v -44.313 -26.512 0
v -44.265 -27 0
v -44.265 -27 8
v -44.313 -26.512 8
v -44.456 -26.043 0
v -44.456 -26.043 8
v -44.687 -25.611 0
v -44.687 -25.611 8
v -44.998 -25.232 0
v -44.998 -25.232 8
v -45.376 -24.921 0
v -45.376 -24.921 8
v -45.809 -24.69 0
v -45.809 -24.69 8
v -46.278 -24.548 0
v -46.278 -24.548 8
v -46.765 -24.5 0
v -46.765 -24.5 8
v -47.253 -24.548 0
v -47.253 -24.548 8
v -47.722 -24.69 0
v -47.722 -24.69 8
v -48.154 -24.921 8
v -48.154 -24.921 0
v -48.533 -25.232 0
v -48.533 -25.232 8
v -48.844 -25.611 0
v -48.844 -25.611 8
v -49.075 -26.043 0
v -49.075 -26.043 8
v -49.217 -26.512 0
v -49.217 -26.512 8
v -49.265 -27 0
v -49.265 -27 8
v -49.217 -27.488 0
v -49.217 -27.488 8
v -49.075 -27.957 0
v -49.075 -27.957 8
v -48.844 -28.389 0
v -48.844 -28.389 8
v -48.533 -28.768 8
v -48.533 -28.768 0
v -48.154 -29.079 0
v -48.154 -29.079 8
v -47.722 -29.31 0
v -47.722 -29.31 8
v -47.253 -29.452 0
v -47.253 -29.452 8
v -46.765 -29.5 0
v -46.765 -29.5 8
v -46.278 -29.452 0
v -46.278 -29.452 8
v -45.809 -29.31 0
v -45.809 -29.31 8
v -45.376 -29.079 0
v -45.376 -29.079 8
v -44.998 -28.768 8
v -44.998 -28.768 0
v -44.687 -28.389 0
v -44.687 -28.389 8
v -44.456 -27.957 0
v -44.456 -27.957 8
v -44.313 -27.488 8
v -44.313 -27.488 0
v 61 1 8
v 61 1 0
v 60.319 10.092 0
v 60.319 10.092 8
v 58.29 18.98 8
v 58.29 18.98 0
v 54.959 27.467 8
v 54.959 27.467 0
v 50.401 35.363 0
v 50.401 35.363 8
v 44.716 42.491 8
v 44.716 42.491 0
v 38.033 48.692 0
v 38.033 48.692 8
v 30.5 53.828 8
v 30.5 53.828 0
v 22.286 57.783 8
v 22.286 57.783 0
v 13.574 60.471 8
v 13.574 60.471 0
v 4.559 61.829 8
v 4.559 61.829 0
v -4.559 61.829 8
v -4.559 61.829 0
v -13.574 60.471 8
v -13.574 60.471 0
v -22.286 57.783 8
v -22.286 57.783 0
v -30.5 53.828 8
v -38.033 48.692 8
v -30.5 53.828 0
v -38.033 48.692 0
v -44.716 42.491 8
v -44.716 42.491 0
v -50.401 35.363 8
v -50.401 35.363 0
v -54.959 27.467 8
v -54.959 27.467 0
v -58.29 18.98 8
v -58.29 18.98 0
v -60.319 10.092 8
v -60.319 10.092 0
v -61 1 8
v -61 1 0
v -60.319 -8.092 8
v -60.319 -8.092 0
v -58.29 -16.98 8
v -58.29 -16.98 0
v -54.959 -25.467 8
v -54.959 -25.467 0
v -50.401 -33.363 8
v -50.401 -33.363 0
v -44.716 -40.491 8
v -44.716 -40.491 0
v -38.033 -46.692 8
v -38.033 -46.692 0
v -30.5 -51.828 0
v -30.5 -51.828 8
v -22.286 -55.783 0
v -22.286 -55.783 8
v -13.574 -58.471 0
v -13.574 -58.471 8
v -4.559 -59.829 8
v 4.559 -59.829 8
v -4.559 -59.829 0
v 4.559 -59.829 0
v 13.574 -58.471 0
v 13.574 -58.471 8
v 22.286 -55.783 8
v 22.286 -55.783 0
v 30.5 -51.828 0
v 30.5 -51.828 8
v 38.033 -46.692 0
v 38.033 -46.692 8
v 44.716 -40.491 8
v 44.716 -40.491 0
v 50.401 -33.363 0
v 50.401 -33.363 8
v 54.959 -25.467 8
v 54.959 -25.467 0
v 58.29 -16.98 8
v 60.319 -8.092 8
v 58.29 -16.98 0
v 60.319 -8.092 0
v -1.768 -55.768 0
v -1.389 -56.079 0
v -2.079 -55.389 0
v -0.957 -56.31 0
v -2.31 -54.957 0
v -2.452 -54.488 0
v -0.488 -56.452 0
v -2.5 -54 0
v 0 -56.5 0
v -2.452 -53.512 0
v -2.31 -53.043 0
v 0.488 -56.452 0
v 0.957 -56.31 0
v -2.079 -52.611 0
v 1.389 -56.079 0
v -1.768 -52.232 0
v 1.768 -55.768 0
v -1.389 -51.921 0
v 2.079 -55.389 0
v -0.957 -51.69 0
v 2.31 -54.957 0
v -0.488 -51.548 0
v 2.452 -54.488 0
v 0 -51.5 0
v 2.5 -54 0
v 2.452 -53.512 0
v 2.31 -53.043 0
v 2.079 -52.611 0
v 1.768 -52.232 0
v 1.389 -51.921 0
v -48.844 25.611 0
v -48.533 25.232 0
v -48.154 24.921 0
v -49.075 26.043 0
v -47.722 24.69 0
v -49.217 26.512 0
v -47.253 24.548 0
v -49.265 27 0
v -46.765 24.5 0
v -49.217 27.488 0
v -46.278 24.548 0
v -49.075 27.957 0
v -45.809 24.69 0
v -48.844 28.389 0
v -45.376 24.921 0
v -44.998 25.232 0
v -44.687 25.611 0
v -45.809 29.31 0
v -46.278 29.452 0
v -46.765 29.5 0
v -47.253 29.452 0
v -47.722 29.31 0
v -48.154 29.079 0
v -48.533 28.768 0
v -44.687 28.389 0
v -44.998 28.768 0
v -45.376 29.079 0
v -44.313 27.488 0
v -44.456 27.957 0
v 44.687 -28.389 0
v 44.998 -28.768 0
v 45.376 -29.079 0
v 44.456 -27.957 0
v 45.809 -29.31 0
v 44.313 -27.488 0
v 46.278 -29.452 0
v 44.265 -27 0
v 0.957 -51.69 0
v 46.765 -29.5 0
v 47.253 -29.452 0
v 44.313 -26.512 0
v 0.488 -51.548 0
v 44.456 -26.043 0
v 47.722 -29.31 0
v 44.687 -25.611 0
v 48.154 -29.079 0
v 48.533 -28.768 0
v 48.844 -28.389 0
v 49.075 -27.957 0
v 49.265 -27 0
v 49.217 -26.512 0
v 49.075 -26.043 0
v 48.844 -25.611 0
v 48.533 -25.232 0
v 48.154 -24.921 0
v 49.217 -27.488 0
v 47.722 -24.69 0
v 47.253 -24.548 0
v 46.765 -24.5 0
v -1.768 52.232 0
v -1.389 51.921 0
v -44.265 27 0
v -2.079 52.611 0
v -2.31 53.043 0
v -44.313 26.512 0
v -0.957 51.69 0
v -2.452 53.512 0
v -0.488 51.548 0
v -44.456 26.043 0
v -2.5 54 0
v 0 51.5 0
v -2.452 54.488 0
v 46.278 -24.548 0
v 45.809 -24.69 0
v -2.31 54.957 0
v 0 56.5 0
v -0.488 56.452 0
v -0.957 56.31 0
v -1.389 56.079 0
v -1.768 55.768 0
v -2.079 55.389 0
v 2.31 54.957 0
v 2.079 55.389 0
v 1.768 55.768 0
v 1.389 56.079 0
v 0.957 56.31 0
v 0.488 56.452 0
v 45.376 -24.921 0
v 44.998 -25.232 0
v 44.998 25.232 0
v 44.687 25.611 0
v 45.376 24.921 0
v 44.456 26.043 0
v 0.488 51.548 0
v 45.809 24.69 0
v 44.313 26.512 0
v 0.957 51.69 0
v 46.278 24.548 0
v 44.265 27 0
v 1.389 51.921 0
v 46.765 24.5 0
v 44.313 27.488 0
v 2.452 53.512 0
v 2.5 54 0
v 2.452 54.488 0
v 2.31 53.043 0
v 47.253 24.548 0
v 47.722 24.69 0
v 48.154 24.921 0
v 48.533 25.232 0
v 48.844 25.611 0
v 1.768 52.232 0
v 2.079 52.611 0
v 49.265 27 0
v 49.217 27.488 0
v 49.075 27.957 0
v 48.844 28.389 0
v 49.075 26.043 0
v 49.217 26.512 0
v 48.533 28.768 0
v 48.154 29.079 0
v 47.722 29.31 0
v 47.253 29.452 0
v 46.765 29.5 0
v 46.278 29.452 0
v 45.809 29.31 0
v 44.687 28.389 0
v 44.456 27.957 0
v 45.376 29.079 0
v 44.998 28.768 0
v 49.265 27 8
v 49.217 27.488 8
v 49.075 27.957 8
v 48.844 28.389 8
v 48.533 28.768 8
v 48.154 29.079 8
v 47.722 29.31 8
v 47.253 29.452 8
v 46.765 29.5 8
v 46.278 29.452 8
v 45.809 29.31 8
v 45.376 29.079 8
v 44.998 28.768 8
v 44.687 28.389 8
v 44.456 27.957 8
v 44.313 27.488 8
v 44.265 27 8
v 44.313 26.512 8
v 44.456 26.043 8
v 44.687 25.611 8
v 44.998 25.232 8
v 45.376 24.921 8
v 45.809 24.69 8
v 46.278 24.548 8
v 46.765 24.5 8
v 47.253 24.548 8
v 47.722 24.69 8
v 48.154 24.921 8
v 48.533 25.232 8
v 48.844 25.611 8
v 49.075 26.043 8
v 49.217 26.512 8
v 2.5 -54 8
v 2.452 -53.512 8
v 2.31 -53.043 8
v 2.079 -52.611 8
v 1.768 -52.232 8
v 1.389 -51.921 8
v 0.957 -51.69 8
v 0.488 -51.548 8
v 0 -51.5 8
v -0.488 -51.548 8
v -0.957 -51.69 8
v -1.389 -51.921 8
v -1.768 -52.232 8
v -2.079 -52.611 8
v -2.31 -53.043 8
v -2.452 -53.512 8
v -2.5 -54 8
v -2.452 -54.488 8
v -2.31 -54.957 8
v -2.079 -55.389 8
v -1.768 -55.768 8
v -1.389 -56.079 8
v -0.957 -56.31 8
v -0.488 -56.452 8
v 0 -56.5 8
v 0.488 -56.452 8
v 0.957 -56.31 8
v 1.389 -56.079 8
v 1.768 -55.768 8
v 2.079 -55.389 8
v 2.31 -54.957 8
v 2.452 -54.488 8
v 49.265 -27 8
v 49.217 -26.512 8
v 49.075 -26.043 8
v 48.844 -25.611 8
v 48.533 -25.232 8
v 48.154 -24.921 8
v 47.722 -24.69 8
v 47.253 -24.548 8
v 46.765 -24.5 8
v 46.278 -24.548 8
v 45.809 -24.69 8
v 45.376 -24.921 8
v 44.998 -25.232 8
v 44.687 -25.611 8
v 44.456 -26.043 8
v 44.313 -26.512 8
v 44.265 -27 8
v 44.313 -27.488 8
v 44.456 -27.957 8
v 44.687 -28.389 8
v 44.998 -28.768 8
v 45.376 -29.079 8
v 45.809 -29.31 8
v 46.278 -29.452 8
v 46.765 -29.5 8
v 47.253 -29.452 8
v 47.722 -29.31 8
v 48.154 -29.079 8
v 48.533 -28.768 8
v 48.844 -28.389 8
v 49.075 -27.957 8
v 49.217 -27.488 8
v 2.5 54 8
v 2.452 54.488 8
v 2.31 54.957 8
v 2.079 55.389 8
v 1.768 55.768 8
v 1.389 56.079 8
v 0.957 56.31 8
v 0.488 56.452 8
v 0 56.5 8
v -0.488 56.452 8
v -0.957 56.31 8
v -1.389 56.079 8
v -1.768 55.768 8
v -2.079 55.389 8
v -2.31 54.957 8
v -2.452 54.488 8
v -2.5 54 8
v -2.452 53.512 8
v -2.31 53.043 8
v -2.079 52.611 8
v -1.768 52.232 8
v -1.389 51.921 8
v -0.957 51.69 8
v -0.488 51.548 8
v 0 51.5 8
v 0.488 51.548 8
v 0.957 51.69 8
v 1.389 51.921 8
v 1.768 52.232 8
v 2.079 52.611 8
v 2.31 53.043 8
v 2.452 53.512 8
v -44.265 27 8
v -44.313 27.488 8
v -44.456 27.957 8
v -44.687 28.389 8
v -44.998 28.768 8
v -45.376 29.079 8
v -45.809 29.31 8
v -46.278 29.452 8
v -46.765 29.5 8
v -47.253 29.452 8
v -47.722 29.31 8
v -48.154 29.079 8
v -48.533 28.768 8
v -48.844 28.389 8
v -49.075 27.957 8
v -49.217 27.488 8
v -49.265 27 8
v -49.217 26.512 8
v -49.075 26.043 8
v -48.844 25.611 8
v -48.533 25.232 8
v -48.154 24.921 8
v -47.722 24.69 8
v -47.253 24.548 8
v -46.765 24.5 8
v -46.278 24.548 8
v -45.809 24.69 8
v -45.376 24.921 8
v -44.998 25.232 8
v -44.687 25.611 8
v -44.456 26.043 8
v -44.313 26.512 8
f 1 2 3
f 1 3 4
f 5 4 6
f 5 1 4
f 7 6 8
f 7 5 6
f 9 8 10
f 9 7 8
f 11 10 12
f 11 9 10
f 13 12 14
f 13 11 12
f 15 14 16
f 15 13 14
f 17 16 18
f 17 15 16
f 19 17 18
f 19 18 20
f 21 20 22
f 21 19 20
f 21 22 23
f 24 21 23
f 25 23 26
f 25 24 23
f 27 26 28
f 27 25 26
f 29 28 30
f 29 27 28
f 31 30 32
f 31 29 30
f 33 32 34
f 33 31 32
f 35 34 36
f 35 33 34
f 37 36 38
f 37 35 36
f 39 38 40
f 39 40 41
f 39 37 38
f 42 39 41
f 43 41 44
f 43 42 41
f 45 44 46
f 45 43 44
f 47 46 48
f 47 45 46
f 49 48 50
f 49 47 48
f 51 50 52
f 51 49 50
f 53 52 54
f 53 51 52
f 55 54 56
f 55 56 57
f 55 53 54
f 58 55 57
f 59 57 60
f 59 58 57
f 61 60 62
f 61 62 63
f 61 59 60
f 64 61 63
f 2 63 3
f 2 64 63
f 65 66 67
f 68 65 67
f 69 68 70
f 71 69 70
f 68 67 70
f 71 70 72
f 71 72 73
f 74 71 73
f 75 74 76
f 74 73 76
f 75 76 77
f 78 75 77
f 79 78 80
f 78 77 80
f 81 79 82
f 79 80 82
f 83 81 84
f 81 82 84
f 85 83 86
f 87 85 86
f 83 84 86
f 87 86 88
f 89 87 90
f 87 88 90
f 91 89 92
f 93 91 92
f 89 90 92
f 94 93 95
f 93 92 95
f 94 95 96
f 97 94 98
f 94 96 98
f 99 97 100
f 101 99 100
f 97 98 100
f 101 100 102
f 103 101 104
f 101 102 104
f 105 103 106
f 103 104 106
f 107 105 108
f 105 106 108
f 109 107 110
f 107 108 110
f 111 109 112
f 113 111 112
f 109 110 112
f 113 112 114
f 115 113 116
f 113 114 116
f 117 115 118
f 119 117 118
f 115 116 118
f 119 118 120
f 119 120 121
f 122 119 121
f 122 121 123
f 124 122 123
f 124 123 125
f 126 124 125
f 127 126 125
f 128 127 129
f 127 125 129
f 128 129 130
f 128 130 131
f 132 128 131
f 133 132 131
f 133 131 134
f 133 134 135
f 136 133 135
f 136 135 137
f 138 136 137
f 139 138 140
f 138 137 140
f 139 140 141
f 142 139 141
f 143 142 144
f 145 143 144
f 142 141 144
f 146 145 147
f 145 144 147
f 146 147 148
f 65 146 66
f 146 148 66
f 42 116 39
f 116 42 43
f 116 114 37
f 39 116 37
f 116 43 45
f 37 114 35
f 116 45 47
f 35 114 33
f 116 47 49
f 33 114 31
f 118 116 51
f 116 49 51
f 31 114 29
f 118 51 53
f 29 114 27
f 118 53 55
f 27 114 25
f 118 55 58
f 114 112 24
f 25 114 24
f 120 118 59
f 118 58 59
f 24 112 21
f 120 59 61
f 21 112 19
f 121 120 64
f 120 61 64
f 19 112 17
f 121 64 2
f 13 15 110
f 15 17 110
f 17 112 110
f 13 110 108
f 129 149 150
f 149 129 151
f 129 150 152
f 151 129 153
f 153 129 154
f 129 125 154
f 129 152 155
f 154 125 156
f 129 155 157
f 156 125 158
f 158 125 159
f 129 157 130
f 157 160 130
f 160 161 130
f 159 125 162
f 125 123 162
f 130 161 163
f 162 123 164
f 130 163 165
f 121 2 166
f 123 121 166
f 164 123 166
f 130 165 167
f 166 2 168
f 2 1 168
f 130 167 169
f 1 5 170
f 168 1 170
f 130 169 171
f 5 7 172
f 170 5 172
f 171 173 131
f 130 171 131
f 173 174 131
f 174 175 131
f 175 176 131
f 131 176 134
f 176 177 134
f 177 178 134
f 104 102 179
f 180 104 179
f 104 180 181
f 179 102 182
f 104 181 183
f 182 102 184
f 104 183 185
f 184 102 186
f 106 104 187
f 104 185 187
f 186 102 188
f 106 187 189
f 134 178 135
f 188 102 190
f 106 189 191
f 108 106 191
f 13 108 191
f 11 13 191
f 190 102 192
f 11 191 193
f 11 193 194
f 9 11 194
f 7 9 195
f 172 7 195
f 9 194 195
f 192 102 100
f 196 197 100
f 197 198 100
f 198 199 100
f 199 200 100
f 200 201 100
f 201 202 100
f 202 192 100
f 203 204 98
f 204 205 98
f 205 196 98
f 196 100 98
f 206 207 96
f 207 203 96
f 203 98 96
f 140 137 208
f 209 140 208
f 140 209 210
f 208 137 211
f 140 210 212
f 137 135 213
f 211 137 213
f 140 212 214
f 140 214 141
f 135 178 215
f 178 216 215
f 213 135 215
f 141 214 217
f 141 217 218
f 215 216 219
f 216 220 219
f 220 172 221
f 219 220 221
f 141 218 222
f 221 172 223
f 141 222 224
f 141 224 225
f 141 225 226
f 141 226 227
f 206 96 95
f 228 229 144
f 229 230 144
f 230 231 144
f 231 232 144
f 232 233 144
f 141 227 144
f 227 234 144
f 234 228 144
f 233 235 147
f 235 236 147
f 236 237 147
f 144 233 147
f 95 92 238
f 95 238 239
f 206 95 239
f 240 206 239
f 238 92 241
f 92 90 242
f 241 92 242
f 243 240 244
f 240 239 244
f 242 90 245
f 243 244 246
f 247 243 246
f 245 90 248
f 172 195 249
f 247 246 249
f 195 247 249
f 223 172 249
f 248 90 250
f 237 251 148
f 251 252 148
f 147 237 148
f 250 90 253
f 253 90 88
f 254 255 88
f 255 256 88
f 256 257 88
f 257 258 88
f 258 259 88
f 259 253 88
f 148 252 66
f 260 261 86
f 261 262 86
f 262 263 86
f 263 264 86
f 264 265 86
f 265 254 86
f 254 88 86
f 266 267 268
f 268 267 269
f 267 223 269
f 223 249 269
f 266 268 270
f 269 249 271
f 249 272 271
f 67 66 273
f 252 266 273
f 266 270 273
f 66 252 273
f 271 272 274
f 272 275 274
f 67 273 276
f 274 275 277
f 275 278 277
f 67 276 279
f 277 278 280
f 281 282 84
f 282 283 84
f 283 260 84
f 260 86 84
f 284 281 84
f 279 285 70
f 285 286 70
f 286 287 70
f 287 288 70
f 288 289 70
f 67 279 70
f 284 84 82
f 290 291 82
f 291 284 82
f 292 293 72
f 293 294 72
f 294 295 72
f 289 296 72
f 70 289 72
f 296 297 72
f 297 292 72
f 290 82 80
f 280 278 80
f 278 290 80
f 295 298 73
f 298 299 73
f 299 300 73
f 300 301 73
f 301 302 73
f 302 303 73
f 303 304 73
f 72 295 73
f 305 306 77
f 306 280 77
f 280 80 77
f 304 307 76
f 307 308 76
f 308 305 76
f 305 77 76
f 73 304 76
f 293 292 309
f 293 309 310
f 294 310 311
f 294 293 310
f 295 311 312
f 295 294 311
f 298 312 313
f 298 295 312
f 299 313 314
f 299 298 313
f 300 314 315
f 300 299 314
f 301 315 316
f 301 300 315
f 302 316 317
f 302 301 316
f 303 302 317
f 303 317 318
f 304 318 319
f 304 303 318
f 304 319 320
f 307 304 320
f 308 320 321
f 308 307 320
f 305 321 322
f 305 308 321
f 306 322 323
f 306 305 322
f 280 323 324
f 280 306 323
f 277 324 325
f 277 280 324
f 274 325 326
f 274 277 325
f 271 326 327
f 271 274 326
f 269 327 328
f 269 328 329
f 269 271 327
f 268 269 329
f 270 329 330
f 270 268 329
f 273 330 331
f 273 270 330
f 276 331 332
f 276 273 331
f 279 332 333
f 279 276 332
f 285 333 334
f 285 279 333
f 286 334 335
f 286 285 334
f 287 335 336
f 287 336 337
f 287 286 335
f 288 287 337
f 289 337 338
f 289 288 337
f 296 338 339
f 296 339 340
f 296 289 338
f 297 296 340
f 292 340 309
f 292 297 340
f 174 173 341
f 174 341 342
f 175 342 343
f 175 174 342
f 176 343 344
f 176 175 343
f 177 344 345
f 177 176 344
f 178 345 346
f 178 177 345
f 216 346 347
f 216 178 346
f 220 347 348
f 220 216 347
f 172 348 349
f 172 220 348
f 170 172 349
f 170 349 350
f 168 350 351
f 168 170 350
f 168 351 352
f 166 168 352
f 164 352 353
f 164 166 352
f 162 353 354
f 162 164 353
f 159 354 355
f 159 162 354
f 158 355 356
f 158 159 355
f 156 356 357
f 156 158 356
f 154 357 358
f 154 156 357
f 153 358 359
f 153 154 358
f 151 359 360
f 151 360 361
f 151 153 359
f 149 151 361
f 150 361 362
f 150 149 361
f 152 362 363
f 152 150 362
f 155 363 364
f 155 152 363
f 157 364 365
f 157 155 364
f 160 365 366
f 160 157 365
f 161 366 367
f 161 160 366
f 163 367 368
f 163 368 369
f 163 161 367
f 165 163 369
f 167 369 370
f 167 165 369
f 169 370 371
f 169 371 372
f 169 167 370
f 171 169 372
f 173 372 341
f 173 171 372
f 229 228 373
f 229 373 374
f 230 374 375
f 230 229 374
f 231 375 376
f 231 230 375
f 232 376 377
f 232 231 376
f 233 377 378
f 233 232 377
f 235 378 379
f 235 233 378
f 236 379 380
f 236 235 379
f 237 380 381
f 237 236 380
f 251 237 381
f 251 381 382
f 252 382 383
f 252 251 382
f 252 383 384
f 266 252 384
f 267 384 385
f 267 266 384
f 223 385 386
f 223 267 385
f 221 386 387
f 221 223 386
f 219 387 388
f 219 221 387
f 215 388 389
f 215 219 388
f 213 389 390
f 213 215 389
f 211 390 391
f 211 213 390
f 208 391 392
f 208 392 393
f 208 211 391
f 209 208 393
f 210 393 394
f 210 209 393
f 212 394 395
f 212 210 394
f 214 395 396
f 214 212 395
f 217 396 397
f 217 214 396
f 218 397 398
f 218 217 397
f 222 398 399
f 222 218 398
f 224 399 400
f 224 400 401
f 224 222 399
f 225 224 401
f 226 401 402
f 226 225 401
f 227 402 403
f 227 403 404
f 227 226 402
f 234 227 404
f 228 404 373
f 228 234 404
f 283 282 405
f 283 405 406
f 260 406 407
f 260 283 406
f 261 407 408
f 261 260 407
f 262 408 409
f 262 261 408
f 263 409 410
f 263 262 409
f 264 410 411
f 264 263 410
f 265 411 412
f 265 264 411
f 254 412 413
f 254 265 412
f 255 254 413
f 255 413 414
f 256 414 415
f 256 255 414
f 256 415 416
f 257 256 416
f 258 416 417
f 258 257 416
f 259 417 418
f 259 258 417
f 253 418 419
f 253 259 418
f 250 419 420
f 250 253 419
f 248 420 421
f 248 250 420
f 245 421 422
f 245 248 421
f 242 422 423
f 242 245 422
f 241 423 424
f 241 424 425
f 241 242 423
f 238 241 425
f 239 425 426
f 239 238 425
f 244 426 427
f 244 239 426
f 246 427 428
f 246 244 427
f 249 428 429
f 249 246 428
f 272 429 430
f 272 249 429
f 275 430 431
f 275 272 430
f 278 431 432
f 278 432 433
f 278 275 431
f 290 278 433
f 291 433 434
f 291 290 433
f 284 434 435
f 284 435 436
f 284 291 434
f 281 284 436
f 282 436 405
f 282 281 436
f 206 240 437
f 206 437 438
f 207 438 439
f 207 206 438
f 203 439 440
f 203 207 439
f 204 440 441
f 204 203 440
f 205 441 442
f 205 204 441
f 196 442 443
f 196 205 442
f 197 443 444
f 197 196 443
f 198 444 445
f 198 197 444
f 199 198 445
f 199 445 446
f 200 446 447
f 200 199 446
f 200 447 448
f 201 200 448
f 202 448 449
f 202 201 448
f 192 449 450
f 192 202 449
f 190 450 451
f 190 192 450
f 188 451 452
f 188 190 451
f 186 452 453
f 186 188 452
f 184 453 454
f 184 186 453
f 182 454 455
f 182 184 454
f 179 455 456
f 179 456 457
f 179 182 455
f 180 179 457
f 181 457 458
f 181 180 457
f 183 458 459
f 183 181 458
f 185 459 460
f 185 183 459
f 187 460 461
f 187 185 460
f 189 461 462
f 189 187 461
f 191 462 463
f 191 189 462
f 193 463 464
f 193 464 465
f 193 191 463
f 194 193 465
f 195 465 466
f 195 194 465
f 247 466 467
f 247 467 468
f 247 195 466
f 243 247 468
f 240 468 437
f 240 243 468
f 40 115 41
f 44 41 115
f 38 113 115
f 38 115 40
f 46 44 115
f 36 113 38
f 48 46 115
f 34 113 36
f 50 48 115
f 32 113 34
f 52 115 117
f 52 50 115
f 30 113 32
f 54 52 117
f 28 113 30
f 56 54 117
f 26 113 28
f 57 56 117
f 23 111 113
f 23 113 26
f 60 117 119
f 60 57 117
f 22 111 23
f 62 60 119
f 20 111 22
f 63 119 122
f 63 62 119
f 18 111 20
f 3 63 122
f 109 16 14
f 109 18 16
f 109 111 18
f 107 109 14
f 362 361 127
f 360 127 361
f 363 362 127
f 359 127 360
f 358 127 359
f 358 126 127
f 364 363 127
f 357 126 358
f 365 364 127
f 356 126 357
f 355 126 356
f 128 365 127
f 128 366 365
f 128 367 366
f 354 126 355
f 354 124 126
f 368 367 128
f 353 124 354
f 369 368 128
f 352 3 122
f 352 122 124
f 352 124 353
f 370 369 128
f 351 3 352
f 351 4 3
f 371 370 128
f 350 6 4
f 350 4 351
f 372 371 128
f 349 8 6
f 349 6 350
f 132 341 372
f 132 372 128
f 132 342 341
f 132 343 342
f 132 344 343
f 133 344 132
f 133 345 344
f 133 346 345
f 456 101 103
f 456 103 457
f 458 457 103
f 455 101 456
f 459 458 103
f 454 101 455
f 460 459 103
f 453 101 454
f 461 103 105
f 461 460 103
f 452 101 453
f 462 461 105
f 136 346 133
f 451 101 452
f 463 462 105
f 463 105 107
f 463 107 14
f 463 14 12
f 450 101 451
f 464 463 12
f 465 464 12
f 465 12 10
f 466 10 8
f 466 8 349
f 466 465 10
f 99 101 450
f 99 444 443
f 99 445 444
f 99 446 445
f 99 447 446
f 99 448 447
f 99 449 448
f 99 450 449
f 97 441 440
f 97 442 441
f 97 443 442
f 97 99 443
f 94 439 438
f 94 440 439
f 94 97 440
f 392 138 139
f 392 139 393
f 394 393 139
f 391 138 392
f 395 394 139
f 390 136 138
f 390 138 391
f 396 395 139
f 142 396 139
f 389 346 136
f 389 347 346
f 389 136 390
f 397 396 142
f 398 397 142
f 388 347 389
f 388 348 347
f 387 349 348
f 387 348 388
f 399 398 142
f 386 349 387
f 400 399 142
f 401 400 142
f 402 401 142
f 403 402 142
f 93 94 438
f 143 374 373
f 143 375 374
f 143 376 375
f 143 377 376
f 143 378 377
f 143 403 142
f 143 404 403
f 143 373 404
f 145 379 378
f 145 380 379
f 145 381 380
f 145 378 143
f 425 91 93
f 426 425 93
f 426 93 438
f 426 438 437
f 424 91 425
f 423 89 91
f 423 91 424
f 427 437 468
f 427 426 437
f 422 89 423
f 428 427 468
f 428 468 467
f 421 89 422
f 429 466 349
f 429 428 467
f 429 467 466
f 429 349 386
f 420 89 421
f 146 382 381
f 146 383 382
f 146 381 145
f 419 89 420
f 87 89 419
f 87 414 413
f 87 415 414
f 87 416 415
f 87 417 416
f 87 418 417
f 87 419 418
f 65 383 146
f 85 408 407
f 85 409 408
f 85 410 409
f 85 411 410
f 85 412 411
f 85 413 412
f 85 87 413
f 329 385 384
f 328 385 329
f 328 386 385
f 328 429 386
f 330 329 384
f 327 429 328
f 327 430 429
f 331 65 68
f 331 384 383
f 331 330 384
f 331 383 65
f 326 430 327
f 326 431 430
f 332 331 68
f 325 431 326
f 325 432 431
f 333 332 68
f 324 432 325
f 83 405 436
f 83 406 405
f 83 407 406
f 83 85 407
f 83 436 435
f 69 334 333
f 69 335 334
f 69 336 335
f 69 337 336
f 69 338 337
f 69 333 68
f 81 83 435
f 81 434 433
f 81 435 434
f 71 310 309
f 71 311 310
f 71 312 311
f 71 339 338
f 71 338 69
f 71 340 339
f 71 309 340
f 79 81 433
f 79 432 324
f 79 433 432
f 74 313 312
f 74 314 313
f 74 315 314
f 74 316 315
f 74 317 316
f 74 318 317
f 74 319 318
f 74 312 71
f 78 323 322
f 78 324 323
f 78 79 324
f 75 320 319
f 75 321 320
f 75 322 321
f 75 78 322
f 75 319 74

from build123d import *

# Parameters (mm, degrees)
SKETCH1_R           = 61
SKETCH1_R_2         = 2.5
BOSS_EXTRUDE1_DEPTH = 8


with BuildPart() as part:
    # Sketch1 → Boss-Extrude1 (new body)
    with BuildSketch(Plane(origin=(0, 0, 0), x_dir=(-1, 0, 0), z_dir=(0, 0, 1))):
        with Locations(Location((0, -1, 0), (0, 0, 180))):
            Circle(SKETCH1_R)
        with Locations(Location((0, 54, 0), (0, 0, 180))):
            Circle(SKETCH1_R_2, mode=Mode.SUBTRACT)
        with Locations(Location((46.765371804, 27, 0), (0, 0, 180))):
            Circle(SKETCH1_R_2, mode=Mode.SUBTRACT)
        with Locations(Location((46.765371804, -27, 0), (0, 0, 180))):
            Circle(SKETCH1_R_2, mode=Mode.SUBTRACT)
        with Locations(Location((0, -54, 0), (0, 0, 180))):
            Circle(SKETCH1_R_2, mode=Mode.SUBTRACT)
        with Locations(Location((-46.765371804, -27, 0), (0, 0, 180))):
            Circle(SKETCH1_R_2, mode=Mode.SUBTRACT)
        with Locations(Location((-46.765371804, 27, 0), (0, 0, 180))):
            Circle(SKETCH1_R_2, mode=Mode.SUBTRACT)
    extrude(amount=BOSS_EXTRUDE1_DEPTH)


solid = part.part
